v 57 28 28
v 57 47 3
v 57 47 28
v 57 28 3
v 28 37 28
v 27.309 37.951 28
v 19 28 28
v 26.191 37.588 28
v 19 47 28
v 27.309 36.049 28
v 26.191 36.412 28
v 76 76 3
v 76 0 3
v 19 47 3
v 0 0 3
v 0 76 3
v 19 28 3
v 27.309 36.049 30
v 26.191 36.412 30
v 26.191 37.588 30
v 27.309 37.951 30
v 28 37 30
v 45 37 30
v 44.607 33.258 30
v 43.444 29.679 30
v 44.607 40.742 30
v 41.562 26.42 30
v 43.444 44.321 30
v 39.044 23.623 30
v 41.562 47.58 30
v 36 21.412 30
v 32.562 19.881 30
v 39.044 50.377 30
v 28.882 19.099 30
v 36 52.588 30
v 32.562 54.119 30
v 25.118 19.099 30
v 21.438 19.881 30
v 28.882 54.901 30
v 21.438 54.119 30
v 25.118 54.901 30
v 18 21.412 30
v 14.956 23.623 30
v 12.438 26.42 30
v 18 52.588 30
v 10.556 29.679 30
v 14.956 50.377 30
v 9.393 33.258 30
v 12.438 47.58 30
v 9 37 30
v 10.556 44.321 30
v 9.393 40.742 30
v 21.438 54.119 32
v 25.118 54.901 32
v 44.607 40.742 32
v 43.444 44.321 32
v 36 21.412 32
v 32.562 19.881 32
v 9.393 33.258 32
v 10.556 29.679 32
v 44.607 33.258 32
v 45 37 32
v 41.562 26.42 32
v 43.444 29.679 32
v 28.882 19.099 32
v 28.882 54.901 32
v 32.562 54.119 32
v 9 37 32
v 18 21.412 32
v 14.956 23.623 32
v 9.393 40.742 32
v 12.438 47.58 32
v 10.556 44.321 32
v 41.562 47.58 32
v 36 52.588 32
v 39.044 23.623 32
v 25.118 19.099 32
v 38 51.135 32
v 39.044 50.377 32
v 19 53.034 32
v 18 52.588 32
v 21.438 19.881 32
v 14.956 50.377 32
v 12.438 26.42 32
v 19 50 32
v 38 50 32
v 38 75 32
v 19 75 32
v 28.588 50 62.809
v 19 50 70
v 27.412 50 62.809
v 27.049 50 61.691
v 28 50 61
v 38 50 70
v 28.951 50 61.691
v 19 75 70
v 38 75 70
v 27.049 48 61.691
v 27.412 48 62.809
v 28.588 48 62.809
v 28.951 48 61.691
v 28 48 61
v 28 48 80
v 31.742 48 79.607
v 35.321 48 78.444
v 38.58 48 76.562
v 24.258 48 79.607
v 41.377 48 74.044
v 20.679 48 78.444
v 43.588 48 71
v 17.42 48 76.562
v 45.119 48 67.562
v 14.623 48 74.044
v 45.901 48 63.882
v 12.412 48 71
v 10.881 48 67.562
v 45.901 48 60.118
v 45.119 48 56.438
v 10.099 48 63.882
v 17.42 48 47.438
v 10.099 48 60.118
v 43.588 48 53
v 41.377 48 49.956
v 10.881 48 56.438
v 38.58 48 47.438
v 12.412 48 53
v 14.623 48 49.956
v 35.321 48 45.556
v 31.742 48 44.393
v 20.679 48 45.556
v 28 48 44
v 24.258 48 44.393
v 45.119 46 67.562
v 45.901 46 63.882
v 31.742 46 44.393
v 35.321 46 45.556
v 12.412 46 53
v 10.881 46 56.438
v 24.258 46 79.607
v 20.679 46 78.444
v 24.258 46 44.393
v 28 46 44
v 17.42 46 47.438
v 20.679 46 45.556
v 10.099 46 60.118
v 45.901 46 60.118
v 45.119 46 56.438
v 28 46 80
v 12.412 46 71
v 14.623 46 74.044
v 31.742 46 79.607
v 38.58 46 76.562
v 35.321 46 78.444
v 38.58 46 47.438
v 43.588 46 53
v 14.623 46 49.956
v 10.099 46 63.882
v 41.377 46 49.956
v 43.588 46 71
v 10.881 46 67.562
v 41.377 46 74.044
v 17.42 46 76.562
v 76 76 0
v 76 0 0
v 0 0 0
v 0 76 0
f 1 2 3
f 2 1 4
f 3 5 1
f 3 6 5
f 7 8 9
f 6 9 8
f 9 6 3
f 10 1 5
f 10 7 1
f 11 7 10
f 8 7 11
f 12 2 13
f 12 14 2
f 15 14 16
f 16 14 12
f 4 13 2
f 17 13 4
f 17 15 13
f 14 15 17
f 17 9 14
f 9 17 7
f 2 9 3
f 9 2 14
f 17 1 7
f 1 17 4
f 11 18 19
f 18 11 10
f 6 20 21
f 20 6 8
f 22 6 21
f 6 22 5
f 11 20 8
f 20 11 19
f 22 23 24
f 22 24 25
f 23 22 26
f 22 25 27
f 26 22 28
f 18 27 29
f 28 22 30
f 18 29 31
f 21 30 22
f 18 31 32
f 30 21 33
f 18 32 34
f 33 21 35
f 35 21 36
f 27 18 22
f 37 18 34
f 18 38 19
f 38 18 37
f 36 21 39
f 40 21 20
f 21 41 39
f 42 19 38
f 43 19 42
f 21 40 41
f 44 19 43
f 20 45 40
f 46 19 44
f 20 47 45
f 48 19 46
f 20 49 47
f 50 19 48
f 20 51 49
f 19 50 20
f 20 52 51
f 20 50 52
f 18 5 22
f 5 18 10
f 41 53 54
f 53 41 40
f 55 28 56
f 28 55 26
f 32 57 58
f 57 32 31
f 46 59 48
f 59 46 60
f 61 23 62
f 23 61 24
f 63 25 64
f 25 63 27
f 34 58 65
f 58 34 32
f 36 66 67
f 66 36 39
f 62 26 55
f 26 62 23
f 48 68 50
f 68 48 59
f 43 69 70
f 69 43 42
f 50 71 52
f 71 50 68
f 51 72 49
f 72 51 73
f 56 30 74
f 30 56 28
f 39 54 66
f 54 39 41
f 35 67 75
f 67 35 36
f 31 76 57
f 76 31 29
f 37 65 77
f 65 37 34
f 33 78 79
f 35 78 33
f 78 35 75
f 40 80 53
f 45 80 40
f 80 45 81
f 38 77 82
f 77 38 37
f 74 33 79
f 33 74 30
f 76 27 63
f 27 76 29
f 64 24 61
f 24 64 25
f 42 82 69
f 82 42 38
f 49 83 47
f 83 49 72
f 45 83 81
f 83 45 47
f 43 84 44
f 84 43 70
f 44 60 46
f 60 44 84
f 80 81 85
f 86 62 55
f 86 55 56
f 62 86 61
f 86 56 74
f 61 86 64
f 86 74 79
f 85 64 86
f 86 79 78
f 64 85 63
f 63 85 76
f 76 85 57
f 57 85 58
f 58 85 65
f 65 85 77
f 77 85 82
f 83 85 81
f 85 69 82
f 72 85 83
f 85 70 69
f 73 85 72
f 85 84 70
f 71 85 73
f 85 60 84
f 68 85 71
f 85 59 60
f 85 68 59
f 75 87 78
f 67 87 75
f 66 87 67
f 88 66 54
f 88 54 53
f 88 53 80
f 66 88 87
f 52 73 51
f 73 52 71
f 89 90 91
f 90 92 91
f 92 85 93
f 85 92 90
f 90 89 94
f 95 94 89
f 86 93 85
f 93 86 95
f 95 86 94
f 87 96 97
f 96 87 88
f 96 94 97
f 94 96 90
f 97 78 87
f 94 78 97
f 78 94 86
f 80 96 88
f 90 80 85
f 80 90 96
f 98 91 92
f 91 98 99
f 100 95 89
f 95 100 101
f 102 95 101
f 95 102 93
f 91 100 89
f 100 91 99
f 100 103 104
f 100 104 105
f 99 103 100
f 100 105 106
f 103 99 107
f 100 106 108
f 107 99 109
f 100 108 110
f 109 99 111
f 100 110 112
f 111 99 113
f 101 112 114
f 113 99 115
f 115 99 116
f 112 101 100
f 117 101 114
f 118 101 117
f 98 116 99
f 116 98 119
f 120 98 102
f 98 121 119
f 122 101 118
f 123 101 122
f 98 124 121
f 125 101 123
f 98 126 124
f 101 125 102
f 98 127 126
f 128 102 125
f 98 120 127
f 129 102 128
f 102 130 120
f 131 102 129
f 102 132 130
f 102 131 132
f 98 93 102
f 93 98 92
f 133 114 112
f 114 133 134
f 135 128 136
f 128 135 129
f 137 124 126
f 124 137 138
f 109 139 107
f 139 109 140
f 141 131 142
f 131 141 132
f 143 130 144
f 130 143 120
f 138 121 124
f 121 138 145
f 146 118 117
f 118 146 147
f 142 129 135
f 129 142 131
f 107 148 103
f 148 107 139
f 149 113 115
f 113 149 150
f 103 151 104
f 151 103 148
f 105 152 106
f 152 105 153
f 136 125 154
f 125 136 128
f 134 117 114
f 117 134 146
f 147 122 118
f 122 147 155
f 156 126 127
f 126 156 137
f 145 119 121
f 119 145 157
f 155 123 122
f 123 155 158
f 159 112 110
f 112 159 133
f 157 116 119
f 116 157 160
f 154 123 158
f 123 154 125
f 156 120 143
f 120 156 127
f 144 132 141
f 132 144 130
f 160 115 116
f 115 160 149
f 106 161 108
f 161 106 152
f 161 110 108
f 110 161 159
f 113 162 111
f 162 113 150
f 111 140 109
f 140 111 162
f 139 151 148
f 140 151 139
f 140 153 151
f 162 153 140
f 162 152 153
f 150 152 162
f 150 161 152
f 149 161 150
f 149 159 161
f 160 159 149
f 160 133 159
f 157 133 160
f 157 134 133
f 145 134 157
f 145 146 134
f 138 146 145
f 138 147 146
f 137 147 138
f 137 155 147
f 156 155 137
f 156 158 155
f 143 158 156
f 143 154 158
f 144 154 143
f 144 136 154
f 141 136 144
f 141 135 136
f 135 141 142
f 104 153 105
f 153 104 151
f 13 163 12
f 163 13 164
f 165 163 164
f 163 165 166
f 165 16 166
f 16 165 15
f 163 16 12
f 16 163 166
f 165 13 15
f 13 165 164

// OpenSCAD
// base
cube([76,76,3]);

// pan servo
translate([19,28,3])
servo();

// tilt servo
translate([19,75,70])
rotate([90,90,0])
servo();


module servo()
{
union() {
	cube([38,19,25]);

	// shaft
	translate([8,9,25])
	cylinder(h=2,r=1);

	// shaft platform
	translate([8,9,27])
	cylinder(h=2,r=18);
}
}
